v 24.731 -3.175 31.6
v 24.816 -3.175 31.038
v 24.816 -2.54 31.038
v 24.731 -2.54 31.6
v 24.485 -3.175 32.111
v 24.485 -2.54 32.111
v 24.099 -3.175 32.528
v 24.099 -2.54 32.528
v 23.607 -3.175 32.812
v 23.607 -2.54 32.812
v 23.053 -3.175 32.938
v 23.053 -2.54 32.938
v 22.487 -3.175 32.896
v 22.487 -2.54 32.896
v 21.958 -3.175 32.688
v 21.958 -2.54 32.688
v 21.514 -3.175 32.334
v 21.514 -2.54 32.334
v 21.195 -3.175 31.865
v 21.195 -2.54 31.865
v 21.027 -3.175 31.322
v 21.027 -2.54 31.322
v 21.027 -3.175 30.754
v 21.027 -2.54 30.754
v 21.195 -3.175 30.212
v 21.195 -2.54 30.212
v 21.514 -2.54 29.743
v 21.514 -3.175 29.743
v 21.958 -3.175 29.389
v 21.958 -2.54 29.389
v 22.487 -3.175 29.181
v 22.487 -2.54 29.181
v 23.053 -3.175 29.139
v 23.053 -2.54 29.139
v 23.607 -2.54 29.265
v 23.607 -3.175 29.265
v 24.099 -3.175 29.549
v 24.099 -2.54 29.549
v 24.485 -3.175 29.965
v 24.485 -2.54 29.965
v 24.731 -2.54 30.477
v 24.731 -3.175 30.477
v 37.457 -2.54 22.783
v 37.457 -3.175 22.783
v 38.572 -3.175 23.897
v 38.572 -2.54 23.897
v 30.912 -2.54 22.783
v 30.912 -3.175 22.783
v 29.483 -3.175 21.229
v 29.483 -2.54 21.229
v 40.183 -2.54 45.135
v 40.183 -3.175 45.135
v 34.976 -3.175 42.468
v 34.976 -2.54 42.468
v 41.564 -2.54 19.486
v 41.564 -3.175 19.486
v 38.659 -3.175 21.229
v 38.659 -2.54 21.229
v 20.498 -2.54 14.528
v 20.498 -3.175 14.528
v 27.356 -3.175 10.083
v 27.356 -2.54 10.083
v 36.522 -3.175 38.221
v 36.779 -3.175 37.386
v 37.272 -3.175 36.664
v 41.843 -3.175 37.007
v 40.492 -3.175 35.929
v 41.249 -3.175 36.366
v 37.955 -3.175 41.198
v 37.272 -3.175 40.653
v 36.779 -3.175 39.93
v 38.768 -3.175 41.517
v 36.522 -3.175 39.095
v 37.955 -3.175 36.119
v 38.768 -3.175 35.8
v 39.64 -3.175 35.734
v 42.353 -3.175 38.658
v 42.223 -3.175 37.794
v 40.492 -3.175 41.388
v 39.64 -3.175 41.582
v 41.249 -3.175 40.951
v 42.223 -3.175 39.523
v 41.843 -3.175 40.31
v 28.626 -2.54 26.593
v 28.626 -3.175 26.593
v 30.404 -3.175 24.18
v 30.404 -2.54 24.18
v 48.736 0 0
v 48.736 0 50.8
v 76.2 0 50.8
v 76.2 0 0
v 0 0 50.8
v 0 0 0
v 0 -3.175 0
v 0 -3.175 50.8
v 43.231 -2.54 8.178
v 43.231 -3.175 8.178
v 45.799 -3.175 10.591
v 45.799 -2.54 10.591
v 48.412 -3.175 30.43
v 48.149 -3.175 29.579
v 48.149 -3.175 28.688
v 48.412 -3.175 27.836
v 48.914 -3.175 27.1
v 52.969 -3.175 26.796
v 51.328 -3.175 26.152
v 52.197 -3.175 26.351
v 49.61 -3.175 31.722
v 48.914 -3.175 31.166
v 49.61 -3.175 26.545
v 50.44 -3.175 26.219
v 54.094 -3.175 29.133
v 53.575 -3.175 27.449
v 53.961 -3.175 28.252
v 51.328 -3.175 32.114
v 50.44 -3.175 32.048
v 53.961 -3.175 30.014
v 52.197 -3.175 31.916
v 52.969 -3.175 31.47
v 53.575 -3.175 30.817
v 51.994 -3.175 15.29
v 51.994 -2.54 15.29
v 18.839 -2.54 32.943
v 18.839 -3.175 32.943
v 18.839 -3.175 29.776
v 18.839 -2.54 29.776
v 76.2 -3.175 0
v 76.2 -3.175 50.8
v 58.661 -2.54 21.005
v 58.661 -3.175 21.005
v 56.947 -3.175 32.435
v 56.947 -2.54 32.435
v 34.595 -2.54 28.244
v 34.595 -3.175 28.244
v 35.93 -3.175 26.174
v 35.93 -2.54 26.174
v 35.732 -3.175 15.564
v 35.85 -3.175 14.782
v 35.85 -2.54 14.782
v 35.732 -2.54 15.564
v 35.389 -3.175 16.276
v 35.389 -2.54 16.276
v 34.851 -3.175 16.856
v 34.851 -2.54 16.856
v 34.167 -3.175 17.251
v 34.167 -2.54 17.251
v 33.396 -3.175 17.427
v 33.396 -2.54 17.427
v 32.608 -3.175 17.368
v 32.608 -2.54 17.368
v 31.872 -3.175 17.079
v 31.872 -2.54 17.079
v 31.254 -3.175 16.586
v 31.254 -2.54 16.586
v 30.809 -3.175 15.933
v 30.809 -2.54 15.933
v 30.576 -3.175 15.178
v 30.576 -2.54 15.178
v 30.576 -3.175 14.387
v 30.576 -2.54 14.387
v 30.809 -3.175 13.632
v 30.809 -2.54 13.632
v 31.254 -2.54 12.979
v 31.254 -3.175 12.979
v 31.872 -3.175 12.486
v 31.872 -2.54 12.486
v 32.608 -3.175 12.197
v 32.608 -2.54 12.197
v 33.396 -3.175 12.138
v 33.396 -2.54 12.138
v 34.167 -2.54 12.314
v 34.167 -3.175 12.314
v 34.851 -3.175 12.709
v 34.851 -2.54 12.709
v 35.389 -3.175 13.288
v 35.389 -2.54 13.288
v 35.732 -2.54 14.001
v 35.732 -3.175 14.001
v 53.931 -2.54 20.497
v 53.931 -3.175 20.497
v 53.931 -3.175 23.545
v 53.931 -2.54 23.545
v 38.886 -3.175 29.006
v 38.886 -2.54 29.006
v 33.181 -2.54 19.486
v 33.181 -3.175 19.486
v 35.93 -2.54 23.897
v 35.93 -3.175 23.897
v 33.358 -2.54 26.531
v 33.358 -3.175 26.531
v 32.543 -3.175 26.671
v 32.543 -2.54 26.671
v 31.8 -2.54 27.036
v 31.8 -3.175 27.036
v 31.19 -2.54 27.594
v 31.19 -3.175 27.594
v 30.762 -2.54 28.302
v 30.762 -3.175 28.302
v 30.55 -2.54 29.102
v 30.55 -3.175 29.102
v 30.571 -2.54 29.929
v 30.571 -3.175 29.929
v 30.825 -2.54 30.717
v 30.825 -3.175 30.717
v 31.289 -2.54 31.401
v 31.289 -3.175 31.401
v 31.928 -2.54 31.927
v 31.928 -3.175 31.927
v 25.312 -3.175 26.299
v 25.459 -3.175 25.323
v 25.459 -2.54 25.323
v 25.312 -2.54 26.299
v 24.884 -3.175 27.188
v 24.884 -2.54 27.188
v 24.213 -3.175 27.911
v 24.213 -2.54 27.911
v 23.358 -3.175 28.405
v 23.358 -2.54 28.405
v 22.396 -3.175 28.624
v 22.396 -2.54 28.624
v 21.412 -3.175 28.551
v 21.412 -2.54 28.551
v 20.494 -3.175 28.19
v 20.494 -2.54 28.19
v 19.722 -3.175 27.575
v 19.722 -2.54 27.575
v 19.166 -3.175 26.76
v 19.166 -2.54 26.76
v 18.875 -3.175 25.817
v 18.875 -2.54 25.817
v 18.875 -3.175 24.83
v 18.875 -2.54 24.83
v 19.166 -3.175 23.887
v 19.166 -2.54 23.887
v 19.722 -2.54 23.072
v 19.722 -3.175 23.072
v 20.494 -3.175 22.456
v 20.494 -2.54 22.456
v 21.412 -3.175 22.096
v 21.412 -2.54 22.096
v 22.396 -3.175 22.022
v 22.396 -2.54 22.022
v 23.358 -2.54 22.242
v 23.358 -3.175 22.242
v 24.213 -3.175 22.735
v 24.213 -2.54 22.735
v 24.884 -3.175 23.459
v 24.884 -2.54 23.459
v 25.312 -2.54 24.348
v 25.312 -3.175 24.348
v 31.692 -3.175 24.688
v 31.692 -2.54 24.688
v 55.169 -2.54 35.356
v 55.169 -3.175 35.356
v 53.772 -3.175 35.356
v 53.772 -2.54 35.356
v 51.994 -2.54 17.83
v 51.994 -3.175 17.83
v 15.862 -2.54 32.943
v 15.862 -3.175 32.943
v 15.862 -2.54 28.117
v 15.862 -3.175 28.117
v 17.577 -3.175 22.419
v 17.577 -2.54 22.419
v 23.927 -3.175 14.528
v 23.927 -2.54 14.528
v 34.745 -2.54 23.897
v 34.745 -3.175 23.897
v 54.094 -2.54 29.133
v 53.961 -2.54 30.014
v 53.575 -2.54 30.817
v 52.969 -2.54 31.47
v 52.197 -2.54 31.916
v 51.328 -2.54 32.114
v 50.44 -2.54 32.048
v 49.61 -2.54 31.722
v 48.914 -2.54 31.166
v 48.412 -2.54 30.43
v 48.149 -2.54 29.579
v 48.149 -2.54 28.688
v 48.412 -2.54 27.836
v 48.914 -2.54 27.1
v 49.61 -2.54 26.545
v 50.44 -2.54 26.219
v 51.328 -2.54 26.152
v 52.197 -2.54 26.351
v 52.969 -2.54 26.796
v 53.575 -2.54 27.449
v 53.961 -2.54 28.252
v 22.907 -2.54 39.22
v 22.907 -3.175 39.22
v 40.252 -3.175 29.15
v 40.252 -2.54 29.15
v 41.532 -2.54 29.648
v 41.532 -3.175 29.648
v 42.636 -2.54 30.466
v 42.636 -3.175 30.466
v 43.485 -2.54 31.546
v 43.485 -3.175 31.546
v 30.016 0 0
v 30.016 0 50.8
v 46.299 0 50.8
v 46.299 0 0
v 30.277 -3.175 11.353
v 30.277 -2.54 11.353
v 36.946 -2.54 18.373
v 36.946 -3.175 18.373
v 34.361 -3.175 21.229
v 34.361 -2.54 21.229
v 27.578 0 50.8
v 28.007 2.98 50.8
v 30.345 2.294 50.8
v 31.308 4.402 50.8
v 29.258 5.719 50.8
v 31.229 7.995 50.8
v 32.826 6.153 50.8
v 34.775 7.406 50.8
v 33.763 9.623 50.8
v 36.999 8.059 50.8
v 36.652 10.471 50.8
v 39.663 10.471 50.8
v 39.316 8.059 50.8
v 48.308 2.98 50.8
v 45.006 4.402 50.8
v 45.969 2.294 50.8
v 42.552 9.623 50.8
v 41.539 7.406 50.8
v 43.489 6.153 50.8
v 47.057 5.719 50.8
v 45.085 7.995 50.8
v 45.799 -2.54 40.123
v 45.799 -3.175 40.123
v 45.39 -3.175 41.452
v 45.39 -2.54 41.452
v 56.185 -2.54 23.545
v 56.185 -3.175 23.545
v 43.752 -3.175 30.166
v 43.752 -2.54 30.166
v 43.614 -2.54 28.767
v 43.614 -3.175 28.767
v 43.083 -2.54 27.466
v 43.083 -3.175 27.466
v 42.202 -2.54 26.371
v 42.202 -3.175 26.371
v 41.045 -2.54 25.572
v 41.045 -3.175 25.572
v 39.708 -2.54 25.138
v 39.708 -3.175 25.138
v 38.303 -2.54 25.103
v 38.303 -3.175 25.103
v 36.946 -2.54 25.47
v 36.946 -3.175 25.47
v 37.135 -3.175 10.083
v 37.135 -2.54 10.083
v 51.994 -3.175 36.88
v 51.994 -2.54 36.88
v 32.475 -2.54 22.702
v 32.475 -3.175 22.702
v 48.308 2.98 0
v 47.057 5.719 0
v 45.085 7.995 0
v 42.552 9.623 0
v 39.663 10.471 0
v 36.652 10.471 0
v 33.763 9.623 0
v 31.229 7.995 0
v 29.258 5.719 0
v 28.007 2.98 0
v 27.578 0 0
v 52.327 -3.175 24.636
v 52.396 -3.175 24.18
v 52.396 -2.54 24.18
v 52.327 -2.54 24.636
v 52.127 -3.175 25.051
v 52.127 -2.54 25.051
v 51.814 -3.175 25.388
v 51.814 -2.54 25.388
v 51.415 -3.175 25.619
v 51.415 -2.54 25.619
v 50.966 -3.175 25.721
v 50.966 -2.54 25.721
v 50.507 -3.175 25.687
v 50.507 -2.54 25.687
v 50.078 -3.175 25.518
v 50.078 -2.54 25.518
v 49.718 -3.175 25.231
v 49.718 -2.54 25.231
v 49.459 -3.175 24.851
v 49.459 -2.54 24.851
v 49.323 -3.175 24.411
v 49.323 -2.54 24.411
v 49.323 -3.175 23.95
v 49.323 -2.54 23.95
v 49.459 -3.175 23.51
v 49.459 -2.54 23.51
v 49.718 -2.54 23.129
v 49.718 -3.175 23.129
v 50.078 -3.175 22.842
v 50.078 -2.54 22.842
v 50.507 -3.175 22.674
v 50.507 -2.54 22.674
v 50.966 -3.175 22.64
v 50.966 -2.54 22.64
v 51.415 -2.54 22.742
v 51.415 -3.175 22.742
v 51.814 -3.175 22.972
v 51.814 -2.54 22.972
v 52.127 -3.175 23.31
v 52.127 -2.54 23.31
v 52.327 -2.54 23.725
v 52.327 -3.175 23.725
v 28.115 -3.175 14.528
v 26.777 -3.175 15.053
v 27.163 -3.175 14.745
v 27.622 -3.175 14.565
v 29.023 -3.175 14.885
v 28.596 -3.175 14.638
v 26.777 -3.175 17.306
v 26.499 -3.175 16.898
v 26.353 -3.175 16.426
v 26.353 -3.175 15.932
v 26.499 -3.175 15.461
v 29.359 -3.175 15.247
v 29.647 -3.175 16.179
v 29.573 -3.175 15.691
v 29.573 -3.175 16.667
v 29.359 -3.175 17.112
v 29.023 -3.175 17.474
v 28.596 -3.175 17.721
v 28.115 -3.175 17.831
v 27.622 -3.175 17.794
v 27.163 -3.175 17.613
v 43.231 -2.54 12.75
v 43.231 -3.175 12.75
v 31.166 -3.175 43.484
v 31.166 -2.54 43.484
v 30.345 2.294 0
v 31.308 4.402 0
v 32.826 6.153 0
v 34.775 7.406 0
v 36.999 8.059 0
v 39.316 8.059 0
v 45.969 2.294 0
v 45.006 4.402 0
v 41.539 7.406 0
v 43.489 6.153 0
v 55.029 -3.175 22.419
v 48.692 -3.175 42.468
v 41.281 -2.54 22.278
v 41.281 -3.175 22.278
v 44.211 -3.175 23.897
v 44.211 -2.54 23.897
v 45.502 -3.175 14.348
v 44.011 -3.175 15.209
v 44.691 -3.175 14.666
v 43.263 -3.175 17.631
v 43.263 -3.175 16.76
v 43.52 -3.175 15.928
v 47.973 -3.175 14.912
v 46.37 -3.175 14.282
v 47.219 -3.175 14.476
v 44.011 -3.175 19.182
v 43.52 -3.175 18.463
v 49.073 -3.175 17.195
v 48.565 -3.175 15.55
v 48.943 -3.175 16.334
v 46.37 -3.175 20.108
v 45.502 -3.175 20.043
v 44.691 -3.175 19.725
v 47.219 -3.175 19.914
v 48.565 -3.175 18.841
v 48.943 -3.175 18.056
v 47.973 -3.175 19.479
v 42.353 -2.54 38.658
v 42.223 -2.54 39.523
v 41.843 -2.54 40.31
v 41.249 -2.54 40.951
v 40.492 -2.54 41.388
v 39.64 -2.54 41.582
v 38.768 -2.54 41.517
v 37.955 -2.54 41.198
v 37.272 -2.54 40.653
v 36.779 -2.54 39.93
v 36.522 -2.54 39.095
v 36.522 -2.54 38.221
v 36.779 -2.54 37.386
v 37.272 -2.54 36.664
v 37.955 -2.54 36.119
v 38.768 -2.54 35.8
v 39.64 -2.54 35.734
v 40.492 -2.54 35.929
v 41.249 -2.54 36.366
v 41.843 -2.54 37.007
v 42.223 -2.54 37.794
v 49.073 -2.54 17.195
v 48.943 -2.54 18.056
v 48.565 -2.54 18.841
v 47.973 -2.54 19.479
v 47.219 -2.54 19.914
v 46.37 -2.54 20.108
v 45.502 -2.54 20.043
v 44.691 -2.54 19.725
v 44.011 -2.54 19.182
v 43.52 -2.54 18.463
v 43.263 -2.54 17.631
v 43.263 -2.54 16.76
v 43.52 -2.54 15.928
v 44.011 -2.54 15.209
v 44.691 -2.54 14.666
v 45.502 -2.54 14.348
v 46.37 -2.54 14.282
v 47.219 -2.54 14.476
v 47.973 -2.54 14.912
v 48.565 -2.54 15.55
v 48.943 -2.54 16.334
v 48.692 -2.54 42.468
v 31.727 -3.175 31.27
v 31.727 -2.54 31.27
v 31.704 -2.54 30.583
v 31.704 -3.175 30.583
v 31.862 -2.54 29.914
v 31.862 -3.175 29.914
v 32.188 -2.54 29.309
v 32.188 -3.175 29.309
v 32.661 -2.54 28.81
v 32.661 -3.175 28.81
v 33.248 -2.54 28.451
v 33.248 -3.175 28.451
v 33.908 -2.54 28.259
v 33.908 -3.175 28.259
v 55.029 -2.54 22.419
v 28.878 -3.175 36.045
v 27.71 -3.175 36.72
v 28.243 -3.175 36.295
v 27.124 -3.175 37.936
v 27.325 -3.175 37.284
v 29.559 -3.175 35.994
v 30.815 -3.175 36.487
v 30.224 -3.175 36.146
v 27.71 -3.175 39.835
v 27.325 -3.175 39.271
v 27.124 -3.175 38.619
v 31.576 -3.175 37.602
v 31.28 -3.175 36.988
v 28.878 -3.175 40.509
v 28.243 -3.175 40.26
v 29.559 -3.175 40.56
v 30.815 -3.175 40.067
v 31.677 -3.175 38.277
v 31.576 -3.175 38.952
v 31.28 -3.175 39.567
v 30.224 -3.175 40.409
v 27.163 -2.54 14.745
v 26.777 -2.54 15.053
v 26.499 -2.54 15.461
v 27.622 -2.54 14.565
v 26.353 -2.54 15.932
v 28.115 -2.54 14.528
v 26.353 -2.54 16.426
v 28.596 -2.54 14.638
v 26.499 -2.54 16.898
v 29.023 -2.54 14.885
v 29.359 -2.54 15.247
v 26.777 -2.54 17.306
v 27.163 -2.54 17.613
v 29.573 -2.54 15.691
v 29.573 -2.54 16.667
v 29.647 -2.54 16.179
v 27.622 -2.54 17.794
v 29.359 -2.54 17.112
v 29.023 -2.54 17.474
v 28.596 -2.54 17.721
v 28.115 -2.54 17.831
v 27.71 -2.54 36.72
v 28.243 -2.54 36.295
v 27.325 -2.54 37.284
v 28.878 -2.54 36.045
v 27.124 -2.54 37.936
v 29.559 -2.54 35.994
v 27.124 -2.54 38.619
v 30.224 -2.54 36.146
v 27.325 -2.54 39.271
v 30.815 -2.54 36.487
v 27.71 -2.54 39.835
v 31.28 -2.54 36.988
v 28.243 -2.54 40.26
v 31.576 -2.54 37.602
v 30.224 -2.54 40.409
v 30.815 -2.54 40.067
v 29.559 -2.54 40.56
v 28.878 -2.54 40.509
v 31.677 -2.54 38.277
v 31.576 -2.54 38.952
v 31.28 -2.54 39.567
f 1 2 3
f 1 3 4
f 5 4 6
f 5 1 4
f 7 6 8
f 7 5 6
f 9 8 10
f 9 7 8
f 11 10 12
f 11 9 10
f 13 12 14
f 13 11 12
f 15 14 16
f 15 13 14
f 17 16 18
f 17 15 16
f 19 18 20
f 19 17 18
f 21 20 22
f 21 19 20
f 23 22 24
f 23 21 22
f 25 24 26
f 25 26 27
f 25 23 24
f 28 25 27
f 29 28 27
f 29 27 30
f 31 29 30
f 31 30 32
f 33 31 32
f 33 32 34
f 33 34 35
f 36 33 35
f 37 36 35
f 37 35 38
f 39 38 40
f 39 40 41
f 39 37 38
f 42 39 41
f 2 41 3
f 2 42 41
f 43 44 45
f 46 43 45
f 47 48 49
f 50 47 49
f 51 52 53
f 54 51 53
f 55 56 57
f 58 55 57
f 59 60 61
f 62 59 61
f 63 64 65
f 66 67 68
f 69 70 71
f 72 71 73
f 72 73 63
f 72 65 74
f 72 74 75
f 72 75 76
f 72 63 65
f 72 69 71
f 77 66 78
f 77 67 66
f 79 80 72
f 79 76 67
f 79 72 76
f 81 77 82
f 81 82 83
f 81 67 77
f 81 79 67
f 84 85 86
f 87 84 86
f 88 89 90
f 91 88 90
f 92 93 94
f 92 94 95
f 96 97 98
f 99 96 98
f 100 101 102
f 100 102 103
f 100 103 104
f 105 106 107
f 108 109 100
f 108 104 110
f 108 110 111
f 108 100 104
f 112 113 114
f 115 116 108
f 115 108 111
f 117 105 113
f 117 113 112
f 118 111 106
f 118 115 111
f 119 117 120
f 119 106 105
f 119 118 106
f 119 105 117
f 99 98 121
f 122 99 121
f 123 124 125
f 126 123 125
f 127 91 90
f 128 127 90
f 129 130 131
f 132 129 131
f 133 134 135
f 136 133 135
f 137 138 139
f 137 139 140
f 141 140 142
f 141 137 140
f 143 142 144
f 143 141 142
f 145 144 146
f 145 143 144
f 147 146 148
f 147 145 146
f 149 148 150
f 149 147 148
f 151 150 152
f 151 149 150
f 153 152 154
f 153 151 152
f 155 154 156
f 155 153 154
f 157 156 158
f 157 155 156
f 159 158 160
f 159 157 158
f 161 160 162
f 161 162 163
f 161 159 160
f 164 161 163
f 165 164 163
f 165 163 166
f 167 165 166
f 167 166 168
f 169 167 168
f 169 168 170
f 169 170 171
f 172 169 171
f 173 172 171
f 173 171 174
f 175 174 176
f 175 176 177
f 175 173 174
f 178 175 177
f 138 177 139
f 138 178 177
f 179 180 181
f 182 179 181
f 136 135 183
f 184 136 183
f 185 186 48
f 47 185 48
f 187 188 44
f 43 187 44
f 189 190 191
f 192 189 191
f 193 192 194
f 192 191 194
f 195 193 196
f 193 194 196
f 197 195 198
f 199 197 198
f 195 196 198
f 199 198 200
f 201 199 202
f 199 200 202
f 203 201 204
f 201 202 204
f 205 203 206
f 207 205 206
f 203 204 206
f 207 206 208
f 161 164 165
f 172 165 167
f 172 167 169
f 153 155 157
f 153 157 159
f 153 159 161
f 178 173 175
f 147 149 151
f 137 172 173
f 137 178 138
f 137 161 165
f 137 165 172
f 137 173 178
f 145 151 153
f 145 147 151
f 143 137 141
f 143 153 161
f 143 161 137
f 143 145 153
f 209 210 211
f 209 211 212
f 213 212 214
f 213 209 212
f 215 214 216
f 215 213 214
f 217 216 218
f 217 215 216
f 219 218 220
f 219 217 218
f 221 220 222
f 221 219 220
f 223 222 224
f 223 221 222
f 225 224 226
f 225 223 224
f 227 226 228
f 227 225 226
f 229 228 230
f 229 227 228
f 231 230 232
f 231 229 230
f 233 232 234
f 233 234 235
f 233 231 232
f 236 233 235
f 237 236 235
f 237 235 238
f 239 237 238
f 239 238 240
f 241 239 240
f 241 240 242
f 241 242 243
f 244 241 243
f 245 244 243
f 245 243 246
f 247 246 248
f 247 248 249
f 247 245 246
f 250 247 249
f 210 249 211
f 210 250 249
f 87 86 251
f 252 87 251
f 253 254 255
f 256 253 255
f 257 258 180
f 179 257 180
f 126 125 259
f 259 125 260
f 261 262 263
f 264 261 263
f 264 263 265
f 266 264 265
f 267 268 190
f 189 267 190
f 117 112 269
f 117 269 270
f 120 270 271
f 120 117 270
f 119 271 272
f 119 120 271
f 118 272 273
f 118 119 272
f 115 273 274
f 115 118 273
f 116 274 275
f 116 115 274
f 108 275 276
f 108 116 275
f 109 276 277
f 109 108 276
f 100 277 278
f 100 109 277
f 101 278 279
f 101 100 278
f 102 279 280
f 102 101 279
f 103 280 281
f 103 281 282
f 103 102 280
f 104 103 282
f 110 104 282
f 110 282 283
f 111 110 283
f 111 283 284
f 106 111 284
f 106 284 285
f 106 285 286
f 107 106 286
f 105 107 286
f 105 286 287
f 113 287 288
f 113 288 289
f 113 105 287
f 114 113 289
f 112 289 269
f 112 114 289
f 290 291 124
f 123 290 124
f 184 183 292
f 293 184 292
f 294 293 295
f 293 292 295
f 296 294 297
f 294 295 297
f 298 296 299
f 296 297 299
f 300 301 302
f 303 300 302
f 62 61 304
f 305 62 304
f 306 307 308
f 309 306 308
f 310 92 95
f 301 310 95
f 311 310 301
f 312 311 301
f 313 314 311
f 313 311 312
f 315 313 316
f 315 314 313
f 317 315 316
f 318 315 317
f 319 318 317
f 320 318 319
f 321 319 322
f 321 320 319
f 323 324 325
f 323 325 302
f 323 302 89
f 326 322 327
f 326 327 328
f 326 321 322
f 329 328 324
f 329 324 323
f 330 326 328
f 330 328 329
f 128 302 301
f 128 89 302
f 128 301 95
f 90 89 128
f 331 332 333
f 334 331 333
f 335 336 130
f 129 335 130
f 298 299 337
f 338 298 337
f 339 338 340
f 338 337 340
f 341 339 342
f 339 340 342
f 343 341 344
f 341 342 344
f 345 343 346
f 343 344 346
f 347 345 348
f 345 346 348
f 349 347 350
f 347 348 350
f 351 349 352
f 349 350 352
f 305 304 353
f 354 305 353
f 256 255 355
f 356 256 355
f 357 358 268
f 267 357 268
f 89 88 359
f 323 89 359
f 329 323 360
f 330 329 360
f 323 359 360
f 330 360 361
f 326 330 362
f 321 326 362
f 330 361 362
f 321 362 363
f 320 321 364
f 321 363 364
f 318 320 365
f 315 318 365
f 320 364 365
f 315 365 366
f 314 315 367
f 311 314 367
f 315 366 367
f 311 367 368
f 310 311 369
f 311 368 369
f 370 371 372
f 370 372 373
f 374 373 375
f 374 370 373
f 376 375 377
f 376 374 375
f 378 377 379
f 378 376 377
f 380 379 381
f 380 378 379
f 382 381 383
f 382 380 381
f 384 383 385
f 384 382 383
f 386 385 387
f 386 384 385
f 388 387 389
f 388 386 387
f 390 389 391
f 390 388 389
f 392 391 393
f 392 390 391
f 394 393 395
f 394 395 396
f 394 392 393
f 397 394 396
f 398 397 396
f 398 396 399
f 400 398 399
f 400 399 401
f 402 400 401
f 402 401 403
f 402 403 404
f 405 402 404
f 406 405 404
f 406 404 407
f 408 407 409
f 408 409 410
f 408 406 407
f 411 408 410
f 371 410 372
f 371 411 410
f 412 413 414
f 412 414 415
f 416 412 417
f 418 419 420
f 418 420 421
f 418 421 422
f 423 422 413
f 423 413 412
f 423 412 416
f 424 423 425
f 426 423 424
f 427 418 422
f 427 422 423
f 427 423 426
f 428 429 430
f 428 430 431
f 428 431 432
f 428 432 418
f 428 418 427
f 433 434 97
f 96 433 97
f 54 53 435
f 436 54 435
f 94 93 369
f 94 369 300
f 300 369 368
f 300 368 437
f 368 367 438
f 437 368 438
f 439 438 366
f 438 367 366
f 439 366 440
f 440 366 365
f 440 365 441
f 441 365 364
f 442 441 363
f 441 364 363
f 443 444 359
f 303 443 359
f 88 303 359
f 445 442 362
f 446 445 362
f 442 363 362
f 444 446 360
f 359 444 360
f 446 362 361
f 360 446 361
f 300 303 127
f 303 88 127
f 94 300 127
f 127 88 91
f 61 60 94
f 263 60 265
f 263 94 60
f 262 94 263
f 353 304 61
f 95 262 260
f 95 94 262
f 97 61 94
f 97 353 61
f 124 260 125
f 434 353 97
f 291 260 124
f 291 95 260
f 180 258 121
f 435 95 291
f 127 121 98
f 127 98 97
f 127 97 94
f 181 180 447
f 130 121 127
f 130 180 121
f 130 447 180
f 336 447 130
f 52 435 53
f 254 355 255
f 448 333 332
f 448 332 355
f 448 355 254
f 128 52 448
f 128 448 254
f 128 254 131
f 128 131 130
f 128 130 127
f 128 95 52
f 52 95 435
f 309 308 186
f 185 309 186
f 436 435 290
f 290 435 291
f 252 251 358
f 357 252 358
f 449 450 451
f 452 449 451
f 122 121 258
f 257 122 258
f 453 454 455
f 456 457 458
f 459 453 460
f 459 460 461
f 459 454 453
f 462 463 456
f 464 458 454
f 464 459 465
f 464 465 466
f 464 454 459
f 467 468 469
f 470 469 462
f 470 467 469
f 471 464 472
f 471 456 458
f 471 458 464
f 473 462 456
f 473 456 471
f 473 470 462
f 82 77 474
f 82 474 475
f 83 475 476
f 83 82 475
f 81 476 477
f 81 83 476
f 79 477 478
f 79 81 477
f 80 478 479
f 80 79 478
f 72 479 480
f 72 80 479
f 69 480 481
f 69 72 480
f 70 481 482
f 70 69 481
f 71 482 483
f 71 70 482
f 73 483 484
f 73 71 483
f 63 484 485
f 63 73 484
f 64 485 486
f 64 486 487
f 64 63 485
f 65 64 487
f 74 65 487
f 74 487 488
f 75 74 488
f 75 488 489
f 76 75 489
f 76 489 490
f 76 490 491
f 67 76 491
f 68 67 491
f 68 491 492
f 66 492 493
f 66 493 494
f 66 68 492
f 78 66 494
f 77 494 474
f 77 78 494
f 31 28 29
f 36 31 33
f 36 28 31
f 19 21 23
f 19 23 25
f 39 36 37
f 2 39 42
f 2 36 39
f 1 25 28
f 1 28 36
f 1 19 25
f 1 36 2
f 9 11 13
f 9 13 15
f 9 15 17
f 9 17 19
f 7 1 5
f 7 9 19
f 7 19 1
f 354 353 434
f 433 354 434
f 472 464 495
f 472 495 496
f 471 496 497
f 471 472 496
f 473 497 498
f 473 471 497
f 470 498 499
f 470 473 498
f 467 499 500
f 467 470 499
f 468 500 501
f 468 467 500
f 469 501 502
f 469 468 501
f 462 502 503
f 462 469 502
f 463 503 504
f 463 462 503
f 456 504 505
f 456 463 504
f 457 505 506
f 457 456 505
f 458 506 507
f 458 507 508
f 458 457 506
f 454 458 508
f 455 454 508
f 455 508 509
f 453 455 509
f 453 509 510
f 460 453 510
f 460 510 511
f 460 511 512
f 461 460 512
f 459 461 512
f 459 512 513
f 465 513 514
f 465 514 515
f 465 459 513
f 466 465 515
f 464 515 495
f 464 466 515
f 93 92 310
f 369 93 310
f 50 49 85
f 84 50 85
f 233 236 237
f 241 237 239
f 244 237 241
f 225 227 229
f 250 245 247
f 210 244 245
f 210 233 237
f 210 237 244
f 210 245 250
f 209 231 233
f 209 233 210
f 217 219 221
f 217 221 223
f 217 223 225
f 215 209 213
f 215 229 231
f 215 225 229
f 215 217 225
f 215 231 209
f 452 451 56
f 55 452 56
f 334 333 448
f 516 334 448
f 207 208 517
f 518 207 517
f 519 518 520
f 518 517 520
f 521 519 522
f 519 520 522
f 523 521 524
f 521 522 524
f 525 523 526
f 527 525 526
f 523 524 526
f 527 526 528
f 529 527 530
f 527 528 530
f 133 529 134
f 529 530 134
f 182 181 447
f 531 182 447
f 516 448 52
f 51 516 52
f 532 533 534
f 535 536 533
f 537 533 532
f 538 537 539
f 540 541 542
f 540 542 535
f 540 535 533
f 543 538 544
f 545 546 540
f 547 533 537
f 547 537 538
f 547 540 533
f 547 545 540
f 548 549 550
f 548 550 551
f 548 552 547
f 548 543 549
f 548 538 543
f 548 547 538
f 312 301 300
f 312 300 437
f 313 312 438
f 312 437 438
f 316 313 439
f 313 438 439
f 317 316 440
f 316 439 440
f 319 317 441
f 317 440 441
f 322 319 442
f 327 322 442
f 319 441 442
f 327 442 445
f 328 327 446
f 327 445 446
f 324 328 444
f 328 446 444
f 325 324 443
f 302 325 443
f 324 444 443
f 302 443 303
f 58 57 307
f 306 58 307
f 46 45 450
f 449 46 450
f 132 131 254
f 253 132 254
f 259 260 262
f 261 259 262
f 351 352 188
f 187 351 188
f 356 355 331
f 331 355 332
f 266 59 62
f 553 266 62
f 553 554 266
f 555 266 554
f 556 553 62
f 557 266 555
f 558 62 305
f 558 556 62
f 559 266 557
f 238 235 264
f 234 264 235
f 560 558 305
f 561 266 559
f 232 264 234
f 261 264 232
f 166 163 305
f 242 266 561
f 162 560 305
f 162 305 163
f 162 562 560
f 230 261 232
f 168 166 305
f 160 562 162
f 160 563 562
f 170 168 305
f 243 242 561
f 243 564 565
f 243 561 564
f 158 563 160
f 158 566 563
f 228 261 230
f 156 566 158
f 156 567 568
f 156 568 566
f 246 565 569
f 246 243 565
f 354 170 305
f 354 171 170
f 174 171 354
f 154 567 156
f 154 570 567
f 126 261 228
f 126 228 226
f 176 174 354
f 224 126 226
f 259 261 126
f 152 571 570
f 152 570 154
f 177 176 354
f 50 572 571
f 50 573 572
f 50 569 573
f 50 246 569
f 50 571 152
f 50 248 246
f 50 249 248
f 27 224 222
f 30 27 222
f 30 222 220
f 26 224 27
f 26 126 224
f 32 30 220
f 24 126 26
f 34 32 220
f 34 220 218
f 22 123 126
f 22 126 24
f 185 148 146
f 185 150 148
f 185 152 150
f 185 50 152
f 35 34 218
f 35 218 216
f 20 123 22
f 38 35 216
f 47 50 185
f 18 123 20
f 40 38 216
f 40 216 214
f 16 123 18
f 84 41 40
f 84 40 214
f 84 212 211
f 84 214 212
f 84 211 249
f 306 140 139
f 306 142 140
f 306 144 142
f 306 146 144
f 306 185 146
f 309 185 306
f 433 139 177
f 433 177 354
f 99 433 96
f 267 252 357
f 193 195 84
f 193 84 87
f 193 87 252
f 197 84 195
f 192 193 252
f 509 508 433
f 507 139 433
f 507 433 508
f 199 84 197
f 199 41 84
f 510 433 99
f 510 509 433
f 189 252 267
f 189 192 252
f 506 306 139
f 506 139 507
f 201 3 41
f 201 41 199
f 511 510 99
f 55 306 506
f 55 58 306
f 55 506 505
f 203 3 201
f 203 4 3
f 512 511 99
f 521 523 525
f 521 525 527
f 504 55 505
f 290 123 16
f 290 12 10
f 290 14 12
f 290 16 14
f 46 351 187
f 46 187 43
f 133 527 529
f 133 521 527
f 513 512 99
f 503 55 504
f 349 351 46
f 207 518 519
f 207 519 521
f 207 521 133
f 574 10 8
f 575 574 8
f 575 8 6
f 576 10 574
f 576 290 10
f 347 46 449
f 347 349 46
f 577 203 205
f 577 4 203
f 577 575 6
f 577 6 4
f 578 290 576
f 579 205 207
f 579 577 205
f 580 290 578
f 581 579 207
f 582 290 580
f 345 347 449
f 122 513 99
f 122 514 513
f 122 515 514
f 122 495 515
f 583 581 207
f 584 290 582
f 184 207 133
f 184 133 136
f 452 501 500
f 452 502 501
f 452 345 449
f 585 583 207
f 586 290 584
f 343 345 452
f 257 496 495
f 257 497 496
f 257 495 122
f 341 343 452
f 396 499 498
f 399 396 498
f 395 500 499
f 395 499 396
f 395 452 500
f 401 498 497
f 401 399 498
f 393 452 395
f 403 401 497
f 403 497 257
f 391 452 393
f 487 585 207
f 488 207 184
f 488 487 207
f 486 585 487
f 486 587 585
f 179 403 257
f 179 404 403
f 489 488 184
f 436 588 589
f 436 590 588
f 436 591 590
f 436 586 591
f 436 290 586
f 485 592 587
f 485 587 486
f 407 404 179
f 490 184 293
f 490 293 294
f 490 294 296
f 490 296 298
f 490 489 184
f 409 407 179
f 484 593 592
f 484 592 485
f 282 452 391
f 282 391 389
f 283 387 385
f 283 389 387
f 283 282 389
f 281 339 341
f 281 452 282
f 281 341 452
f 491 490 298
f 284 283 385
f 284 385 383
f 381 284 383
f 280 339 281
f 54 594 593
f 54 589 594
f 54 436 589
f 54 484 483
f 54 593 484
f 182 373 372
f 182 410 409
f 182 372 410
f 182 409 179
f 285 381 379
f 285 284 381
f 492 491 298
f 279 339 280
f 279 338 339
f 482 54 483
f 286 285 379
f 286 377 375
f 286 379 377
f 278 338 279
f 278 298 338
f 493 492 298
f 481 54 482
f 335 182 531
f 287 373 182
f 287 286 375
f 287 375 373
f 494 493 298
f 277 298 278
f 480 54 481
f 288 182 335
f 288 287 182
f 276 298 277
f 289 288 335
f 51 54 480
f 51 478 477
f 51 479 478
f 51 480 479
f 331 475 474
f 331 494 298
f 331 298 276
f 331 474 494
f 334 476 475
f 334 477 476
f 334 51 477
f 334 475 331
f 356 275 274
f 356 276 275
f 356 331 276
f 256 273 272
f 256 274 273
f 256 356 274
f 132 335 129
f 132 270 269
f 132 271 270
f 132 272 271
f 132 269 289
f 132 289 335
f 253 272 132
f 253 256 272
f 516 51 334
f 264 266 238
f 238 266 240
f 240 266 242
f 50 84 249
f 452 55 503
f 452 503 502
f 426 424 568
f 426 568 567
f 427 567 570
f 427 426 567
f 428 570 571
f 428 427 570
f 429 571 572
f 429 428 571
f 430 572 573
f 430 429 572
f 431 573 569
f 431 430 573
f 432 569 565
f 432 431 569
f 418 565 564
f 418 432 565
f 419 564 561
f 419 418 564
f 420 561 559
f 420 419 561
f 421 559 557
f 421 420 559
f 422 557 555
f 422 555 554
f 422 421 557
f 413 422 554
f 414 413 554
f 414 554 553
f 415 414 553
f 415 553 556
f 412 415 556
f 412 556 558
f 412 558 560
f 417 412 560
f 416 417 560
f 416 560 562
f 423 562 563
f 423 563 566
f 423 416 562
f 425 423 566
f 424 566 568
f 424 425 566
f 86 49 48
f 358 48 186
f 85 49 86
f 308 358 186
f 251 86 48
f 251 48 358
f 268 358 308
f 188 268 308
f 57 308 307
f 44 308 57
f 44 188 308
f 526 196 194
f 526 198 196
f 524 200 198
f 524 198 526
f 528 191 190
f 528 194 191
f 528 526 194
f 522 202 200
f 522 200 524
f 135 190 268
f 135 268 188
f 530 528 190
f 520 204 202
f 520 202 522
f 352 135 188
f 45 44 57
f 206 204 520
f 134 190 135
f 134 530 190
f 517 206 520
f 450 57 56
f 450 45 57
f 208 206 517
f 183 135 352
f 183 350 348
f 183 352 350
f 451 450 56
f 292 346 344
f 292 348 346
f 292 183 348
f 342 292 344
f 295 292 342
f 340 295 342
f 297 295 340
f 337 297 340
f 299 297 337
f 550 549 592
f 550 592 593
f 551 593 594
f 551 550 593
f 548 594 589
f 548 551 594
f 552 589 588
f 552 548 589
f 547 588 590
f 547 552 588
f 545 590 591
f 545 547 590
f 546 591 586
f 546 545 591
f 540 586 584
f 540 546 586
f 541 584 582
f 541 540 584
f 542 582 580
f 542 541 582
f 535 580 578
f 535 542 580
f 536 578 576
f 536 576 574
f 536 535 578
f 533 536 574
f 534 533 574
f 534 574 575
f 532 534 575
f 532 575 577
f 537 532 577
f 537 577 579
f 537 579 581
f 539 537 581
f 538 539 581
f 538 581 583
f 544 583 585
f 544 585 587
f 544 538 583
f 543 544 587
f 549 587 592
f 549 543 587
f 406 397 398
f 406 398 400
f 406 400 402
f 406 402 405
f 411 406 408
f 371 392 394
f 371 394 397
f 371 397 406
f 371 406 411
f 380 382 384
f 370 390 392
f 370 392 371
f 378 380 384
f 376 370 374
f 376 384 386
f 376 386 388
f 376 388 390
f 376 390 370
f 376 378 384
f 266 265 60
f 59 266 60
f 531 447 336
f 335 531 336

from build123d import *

# Parameters (mm, degrees)
F0_W     = 76.2
F0_H     = 50.8
F1_DEPTH = 3.175
F2_R     = 1.6558767695
F2_R_2   = 2.6518381977
F2_R_3   = 3.3103533059
F2_R_4   = 2.921000123
F2_R_5   = 1.5450229593
F2_R_6   = 1.9050003029
F2_R_7   = 2.2895237278
F2_R_8   = 2.9892250919
F2_R_9   = 2.9320238784
F3_DEPTH = 0.635
F5_DEPTH = 50.8


# Not quite as in the source:
# - a feature names something its author has since deleted; it is built from what else it names


with BuildPart() as f1:
    # F0 (on Front) → F1 (new body)
    with BuildSketch(Plane.XZ):
        with Locations((38.1, 25.4)):
            Rectangle(F0_W, F0_H)
    extrude(amount=F1_DEPTH)

    # F2 (on face) → F3 (cut)
    with BuildSketch(Plane.XZ.offset(3.175)):
        Polygon((48.691868487, 42.4682941364), (40.1828733117, 45.1352943044), (34.9758711487, 42.4682941364), (31.1658705429, 43.4842941893), (22.9070743114, 39.2204960176), (18.8385191247, 32.9432937858), (18.8385191247, 29.7757912988), (15.8623714775, 32.9432937858), (15.8623714775, 28.1172938255), (17.5768719597, 22.418530716), (23.9268724651, 14.5282934961), (20.4978712678, 14.5282934961), (27.3558708683, 10.0832957385), (30.27687006, 11.35329563), (37.1348724544, 10.0832957385), (43.2308704436, 12.7502943931), (43.2308704436, 8.1782940386), (45.7990180271, 10.59129495), (51.9938726753, 15.2902941761), (51.9938726753, 17.8302939592), (53.930624873, 20.4972944764), (53.930624873, 23.545293471), (55.0292181151, 22.418530716), (56.1848726899, 23.545293471), (58.6613714775, 21.005293688), (56.9468696446, 32.435293643), (55.1688742668, 35.356293766), (53.7718717784, 35.356293766), (51.9938726753, 36.8802941946), (45.7990180271, 40.1225700636), (45.3898717493, 41.4522940835), align=None)
        with Locations((27.9908708141, 16.1792937277)):
            Circle(F2_R, mode=Mode.SUBTRACT)
        with Locations((33.1978739083, 14.7822949646)):
            Circle(F2_R_2, mode=Mode.SUBTRACT)
        with Locations((22.1488724307, 25.3232944367)):
            Circle(F2_R_3, mode=Mode.SUBTRACT)
        with BuildLine():
            Line((29.4827647798, 21.2285935147), (28.6258707598, 26.5932943282))
            Line((28.6258707598, 26.5932943282), (30.4038726569, 24.1802934168))
            Line((30.4038726569, 24.1802934168), (31.6916008863, 24.6882943394))
            Line((31.6916008863, 24.6882943394), (32.4751487195, 22.7020840415))
            Line((32.4751487195, 22.7020840415), (34.7450423849, 23.8972995039))
            Line((34.7450423849, 23.8972995039), (33.3584630646, 26.5306218754))
            ThreePointArc((33.3584630646, 26.5306218754), (30.6271191315, 28.6945286164), (31.9278740168, 31.9272935001))
            ThreePointArc((31.9278740168, 31.9272935001), (32.188274126, 29.3087235679), (34.5948708088, 28.2442945597))
            Line((34.5948708088, 28.2442945597), (35.9297474949, 26.173913466))
            Line((35.9297474949, 26.173913466), (38.8855502865, 29.0062933771))
            ThreePointArc((38.8855502865, 29.0062933771), (41.5322516722, 29.6478879221), (43.484871912, 31.5462940914))
            ThreePointArc((43.484871912, 31.5462940914), (42.2018854798, 26.3705417725), (36.9460296513, 25.4702941614))
            Line((36.9460296513, 25.4702941614), (35.9297474949, 23.8972995039))
            Line((35.9297474949, 23.8972995039), (37.4565196476, 22.7832946537))
            Line((37.4565196476, 22.7832946537), (38.571963384, 23.8972995039))
            Line((38.571963384, 23.8972995039), (41.2807169848, 22.2783325716))
            Line((41.2807169848, 22.2783325716), (44.2106343052, 23.8972995039))
            Line((44.2106343052, 23.8972995039), (41.5642807871, 19.4857340033))
            Line((41.5642807871, 19.4857340033), (38.6588719517, 21.2285935147))
            Line((38.6588719517, 21.2285935147), (36.9460296513, 18.3732244384))
            Line((36.9460296513, 18.3732244384), (34.3611069299, 21.2285935147))
            Line((34.3611069299, 21.2285935147), (33.1806698754, 19.4857340033))
            Line((33.1806698754, 19.4857340033), (30.9118700058, 22.7832946537))
            Line((30.9118700058, 22.7832946537), (29.4827647798, 21.2285935147))
        make_face(mode=Mode.SUBTRACT)
        with Locations((46.1518705666, 17.1952940134)):
            Circle(F2_R_4, mode=Mode.SUBTRACT)
        with Locations((50.8508716554, 24.1802934168)):
            Circle(F2_R_5, mode=Mode.SUBTRACT)
        with Locations((22.9108707823, 31.0382939485)):
            Circle(F2_R_6, mode=Mode.SUBTRACT)
        with Locations((29.3878714398, 38.277293889)):
            Circle(F2_R_7, mode=Mode.SUBTRACT)
        with Locations((51.1048731238, 29.1332941113)):
            Circle(F2_R_8, mode=Mode.SUBTRACT)
        with Locations((39.4208707691, 38.658294229)):
            Circle(F2_R_9, mode=Mode.SUBTRACT)
    extrude(amount=-F3_DEPTH, mode=Mode.SUBTRACT)

    # F4 (on Top) → F5 (join)
    with BuildSketch(Plane.XY):
        with BuildLine():
            ThreePointArc((30.0156539358, 0), (38.1572704301, 8.1416164943), (46.2988869244, 0))
            Line((46.2988869244, 0), (48.7363704301, 0))
            ThreePointArc((48.7363704301, 0), (38.1572704301, 10.5791), (27.5781704301, 0))
            Line((27.5781704301, 0), (30.0156539358, 0))
        make_face()
    extrude(amount=F5_DEPTH)


solid = f1.part
